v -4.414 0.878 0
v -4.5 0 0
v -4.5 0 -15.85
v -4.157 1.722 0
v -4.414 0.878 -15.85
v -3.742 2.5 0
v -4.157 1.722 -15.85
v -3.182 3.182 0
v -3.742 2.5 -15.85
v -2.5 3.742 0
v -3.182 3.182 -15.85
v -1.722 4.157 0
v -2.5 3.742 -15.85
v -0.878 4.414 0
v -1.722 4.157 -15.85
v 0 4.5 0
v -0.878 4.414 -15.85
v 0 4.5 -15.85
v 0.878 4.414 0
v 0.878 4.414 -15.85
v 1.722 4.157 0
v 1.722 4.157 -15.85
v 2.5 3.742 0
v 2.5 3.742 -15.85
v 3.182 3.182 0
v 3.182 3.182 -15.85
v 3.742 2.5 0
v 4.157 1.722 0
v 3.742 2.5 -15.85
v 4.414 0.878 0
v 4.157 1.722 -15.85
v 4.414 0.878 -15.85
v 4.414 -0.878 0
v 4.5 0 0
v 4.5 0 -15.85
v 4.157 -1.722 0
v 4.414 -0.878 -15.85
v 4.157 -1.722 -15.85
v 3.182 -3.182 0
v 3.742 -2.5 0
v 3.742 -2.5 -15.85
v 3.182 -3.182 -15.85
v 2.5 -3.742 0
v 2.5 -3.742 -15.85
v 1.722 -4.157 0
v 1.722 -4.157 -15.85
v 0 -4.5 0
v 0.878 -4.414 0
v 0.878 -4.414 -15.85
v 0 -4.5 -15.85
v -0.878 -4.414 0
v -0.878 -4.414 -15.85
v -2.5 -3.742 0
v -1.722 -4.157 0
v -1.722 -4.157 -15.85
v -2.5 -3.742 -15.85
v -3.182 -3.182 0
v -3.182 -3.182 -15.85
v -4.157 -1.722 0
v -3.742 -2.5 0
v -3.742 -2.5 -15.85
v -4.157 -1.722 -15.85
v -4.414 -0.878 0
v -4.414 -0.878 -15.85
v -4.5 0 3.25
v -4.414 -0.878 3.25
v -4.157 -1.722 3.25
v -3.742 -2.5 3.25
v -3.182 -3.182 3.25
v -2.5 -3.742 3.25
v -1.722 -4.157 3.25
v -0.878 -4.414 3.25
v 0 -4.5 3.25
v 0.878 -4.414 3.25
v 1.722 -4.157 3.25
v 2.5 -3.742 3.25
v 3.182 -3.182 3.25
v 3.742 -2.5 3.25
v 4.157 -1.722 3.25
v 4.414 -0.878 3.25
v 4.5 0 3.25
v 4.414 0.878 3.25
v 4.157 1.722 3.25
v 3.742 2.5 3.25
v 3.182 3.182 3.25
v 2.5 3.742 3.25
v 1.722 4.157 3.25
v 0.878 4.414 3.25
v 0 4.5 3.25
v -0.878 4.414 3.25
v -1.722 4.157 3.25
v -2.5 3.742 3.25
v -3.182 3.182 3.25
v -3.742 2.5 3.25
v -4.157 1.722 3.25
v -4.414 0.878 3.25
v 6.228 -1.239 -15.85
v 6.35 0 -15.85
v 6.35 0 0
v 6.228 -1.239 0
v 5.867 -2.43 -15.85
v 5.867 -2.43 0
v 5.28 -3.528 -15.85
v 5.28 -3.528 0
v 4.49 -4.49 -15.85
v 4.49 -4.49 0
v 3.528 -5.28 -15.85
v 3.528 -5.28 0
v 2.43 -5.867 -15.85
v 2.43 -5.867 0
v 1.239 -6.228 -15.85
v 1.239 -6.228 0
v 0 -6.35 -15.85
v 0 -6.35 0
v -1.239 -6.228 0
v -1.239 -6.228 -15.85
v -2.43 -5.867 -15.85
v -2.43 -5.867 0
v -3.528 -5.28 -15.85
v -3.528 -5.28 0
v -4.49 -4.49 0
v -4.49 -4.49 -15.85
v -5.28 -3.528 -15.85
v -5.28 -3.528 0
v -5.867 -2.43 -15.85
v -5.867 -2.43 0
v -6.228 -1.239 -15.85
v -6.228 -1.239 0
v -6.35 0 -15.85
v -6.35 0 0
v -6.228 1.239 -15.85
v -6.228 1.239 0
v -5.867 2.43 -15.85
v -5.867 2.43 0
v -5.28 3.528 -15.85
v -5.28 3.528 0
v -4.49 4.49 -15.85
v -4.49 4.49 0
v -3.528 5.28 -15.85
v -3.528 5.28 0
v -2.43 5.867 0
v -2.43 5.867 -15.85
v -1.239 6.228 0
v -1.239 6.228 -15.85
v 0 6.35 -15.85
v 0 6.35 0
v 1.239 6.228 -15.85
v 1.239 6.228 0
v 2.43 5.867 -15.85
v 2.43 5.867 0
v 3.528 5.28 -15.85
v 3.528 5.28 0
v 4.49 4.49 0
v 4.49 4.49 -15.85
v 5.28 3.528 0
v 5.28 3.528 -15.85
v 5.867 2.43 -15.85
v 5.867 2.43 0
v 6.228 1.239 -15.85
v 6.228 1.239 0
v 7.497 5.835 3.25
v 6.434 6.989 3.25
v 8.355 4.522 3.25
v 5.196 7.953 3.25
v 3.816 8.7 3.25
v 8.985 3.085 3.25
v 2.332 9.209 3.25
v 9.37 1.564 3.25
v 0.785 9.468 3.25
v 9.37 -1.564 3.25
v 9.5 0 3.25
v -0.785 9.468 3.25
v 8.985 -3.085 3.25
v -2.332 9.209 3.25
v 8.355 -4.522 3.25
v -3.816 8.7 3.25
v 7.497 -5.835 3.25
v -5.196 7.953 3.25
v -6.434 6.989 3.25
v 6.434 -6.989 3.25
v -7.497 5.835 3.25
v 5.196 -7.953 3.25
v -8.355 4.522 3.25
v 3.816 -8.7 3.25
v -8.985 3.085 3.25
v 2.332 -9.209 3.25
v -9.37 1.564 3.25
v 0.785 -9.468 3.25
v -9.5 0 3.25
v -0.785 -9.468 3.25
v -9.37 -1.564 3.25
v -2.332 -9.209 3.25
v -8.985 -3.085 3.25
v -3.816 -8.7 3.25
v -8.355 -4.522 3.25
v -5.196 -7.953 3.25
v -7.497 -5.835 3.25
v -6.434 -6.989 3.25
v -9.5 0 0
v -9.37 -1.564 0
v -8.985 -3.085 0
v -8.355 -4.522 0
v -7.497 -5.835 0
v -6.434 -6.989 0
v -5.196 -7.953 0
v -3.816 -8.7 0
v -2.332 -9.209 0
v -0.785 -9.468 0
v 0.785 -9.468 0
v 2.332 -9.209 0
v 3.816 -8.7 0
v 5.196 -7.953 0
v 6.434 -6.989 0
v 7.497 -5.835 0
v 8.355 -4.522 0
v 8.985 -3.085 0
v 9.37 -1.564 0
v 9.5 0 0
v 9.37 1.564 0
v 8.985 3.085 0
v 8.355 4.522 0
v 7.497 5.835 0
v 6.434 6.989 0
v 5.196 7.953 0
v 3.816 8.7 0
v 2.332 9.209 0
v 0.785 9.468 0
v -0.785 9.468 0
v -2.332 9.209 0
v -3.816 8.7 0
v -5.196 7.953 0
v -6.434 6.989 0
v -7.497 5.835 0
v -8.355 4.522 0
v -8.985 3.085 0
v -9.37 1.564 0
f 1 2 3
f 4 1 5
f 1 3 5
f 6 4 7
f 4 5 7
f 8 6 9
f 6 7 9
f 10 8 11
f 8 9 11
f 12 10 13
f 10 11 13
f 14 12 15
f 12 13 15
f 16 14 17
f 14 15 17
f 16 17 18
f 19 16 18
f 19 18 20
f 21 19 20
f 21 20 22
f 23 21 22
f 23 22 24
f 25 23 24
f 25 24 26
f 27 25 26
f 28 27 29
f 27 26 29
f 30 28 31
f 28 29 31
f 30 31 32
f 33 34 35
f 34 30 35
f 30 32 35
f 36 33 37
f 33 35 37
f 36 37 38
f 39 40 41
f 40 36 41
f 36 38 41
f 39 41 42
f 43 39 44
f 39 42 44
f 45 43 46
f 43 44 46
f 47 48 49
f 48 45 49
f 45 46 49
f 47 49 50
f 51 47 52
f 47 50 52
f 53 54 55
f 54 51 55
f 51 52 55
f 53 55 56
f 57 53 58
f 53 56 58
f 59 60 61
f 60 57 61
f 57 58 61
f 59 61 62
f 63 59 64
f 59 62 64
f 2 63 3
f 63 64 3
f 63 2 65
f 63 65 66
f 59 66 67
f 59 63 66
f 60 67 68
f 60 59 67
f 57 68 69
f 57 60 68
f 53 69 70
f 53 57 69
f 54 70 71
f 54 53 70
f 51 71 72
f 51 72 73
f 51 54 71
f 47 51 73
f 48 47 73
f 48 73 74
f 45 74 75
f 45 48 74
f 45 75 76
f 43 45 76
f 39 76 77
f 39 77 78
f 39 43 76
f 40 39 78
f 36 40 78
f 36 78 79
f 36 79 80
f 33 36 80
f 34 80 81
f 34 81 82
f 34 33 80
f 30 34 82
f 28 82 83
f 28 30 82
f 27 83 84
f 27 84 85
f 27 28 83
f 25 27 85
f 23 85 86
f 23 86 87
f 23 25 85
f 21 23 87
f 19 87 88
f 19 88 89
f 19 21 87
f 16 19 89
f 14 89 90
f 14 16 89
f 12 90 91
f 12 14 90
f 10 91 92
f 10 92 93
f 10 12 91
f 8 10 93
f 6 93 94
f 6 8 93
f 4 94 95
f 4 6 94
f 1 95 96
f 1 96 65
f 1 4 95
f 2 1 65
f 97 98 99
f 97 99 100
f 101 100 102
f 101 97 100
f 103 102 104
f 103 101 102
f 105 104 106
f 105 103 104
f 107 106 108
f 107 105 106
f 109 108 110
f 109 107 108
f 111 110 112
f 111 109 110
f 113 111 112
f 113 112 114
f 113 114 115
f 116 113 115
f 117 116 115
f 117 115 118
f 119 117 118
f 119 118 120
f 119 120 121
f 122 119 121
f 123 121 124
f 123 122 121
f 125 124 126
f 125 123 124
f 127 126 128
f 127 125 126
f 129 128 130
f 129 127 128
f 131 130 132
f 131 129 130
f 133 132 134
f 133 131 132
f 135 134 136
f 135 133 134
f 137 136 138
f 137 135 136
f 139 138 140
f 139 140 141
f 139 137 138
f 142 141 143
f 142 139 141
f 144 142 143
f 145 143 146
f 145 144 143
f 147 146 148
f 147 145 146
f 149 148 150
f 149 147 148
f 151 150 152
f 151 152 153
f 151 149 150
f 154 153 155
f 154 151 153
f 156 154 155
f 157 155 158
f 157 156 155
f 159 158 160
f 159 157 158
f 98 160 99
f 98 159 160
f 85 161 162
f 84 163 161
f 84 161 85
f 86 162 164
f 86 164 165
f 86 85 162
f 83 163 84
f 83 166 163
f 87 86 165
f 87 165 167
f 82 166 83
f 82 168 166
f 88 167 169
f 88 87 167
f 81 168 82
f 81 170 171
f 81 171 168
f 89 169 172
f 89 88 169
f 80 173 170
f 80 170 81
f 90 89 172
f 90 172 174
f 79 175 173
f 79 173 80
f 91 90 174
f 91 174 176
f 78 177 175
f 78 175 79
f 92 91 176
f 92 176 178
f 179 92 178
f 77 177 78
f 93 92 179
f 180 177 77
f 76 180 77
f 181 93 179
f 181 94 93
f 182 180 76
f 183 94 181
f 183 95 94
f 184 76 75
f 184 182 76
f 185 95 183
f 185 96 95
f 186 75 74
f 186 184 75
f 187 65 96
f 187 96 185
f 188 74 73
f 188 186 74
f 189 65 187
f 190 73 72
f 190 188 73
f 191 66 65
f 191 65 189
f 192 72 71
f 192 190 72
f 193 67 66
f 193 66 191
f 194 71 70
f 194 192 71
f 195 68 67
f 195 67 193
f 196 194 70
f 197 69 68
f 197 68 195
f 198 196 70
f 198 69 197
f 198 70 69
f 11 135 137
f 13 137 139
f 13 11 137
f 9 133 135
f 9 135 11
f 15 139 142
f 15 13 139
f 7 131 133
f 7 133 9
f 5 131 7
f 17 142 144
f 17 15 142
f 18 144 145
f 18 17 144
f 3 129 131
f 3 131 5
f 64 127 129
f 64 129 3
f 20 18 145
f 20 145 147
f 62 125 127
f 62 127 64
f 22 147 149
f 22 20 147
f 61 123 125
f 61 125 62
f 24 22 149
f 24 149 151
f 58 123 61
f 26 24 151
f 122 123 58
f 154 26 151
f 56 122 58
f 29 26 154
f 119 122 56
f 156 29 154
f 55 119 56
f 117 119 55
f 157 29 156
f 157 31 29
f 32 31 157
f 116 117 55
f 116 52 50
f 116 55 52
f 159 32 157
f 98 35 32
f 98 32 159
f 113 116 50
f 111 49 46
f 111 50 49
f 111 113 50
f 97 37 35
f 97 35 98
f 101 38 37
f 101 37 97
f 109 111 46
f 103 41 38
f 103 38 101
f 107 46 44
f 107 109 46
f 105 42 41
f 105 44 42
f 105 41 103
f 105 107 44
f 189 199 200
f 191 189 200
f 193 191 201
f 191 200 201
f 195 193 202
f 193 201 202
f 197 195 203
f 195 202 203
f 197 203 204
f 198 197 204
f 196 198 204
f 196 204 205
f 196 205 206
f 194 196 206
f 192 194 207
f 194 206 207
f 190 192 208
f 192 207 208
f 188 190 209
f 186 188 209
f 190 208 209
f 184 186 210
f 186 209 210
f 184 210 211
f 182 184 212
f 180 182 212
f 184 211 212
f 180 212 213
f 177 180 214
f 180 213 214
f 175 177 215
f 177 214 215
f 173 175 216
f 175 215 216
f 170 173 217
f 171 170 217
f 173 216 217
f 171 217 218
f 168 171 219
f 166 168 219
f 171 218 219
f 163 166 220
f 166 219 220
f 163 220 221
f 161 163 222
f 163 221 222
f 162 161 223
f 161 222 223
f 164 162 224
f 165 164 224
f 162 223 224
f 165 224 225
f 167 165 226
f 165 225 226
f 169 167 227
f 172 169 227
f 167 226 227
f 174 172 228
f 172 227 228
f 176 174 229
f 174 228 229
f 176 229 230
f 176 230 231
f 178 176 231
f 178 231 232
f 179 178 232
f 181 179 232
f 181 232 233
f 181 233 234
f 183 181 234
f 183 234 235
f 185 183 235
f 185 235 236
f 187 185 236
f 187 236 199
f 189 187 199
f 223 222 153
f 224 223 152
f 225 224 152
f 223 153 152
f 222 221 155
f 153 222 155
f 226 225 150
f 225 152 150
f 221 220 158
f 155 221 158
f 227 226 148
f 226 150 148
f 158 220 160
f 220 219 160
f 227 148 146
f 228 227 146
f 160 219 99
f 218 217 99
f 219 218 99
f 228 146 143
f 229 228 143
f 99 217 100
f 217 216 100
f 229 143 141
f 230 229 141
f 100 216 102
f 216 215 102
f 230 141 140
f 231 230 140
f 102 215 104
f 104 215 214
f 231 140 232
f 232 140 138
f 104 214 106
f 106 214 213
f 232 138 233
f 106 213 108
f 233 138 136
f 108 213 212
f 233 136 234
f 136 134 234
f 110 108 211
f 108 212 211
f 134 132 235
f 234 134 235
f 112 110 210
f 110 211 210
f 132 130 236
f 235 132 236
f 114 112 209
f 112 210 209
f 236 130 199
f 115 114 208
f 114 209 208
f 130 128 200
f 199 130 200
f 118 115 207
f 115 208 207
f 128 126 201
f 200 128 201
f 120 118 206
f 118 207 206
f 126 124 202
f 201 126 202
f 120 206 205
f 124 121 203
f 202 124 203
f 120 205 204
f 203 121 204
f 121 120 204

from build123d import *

# Parameters (mm, degrees)
SKETCH_1_R      = 9.5
SKETCH_1_R_2    = 4.5
EXTRUDE_1_DEPTH = 3.25
EXTRUDE_START   = 15.85
SKETCH_2_R      = 6.35
SKETCH_2_R_2    = 4.5
EXTRUDE_2_DEPTH = 15.85


with BuildPart() as part:
    # Эскиз1 → Бобышка-Вытянуть1 (new body)
    with BuildSketch(Plane.XY):
        with Locations(Location((0, 0, 0), (0, 0, 180))):
            Circle(SKETCH_1_R)
        with Locations(Location((0, 0, 0), (0, 0, 180))):
            Circle(SKETCH_1_R_2, mode=Mode.SUBTRACT)
    extrude(amount=EXTRUDE_1_DEPTH)

    # Эскиз2 → Бобышка-Вытянуть2 (add)
    with BuildSketch(Plane(origin=(0, 0, 0), x_dir=(-1, 0, 0), z_dir=(0, 0, -1)).offset(EXTRUDE_START)):
        with Locations(Location((0, 0, 0), (0, 0, 180))):
            Circle(SKETCH_2_R)
        Circle(SKETCH_2_R_2, mode=Mode.SUBTRACT)
    extrude(amount=-EXTRUDE_2_DEPTH)


solid = part.part
